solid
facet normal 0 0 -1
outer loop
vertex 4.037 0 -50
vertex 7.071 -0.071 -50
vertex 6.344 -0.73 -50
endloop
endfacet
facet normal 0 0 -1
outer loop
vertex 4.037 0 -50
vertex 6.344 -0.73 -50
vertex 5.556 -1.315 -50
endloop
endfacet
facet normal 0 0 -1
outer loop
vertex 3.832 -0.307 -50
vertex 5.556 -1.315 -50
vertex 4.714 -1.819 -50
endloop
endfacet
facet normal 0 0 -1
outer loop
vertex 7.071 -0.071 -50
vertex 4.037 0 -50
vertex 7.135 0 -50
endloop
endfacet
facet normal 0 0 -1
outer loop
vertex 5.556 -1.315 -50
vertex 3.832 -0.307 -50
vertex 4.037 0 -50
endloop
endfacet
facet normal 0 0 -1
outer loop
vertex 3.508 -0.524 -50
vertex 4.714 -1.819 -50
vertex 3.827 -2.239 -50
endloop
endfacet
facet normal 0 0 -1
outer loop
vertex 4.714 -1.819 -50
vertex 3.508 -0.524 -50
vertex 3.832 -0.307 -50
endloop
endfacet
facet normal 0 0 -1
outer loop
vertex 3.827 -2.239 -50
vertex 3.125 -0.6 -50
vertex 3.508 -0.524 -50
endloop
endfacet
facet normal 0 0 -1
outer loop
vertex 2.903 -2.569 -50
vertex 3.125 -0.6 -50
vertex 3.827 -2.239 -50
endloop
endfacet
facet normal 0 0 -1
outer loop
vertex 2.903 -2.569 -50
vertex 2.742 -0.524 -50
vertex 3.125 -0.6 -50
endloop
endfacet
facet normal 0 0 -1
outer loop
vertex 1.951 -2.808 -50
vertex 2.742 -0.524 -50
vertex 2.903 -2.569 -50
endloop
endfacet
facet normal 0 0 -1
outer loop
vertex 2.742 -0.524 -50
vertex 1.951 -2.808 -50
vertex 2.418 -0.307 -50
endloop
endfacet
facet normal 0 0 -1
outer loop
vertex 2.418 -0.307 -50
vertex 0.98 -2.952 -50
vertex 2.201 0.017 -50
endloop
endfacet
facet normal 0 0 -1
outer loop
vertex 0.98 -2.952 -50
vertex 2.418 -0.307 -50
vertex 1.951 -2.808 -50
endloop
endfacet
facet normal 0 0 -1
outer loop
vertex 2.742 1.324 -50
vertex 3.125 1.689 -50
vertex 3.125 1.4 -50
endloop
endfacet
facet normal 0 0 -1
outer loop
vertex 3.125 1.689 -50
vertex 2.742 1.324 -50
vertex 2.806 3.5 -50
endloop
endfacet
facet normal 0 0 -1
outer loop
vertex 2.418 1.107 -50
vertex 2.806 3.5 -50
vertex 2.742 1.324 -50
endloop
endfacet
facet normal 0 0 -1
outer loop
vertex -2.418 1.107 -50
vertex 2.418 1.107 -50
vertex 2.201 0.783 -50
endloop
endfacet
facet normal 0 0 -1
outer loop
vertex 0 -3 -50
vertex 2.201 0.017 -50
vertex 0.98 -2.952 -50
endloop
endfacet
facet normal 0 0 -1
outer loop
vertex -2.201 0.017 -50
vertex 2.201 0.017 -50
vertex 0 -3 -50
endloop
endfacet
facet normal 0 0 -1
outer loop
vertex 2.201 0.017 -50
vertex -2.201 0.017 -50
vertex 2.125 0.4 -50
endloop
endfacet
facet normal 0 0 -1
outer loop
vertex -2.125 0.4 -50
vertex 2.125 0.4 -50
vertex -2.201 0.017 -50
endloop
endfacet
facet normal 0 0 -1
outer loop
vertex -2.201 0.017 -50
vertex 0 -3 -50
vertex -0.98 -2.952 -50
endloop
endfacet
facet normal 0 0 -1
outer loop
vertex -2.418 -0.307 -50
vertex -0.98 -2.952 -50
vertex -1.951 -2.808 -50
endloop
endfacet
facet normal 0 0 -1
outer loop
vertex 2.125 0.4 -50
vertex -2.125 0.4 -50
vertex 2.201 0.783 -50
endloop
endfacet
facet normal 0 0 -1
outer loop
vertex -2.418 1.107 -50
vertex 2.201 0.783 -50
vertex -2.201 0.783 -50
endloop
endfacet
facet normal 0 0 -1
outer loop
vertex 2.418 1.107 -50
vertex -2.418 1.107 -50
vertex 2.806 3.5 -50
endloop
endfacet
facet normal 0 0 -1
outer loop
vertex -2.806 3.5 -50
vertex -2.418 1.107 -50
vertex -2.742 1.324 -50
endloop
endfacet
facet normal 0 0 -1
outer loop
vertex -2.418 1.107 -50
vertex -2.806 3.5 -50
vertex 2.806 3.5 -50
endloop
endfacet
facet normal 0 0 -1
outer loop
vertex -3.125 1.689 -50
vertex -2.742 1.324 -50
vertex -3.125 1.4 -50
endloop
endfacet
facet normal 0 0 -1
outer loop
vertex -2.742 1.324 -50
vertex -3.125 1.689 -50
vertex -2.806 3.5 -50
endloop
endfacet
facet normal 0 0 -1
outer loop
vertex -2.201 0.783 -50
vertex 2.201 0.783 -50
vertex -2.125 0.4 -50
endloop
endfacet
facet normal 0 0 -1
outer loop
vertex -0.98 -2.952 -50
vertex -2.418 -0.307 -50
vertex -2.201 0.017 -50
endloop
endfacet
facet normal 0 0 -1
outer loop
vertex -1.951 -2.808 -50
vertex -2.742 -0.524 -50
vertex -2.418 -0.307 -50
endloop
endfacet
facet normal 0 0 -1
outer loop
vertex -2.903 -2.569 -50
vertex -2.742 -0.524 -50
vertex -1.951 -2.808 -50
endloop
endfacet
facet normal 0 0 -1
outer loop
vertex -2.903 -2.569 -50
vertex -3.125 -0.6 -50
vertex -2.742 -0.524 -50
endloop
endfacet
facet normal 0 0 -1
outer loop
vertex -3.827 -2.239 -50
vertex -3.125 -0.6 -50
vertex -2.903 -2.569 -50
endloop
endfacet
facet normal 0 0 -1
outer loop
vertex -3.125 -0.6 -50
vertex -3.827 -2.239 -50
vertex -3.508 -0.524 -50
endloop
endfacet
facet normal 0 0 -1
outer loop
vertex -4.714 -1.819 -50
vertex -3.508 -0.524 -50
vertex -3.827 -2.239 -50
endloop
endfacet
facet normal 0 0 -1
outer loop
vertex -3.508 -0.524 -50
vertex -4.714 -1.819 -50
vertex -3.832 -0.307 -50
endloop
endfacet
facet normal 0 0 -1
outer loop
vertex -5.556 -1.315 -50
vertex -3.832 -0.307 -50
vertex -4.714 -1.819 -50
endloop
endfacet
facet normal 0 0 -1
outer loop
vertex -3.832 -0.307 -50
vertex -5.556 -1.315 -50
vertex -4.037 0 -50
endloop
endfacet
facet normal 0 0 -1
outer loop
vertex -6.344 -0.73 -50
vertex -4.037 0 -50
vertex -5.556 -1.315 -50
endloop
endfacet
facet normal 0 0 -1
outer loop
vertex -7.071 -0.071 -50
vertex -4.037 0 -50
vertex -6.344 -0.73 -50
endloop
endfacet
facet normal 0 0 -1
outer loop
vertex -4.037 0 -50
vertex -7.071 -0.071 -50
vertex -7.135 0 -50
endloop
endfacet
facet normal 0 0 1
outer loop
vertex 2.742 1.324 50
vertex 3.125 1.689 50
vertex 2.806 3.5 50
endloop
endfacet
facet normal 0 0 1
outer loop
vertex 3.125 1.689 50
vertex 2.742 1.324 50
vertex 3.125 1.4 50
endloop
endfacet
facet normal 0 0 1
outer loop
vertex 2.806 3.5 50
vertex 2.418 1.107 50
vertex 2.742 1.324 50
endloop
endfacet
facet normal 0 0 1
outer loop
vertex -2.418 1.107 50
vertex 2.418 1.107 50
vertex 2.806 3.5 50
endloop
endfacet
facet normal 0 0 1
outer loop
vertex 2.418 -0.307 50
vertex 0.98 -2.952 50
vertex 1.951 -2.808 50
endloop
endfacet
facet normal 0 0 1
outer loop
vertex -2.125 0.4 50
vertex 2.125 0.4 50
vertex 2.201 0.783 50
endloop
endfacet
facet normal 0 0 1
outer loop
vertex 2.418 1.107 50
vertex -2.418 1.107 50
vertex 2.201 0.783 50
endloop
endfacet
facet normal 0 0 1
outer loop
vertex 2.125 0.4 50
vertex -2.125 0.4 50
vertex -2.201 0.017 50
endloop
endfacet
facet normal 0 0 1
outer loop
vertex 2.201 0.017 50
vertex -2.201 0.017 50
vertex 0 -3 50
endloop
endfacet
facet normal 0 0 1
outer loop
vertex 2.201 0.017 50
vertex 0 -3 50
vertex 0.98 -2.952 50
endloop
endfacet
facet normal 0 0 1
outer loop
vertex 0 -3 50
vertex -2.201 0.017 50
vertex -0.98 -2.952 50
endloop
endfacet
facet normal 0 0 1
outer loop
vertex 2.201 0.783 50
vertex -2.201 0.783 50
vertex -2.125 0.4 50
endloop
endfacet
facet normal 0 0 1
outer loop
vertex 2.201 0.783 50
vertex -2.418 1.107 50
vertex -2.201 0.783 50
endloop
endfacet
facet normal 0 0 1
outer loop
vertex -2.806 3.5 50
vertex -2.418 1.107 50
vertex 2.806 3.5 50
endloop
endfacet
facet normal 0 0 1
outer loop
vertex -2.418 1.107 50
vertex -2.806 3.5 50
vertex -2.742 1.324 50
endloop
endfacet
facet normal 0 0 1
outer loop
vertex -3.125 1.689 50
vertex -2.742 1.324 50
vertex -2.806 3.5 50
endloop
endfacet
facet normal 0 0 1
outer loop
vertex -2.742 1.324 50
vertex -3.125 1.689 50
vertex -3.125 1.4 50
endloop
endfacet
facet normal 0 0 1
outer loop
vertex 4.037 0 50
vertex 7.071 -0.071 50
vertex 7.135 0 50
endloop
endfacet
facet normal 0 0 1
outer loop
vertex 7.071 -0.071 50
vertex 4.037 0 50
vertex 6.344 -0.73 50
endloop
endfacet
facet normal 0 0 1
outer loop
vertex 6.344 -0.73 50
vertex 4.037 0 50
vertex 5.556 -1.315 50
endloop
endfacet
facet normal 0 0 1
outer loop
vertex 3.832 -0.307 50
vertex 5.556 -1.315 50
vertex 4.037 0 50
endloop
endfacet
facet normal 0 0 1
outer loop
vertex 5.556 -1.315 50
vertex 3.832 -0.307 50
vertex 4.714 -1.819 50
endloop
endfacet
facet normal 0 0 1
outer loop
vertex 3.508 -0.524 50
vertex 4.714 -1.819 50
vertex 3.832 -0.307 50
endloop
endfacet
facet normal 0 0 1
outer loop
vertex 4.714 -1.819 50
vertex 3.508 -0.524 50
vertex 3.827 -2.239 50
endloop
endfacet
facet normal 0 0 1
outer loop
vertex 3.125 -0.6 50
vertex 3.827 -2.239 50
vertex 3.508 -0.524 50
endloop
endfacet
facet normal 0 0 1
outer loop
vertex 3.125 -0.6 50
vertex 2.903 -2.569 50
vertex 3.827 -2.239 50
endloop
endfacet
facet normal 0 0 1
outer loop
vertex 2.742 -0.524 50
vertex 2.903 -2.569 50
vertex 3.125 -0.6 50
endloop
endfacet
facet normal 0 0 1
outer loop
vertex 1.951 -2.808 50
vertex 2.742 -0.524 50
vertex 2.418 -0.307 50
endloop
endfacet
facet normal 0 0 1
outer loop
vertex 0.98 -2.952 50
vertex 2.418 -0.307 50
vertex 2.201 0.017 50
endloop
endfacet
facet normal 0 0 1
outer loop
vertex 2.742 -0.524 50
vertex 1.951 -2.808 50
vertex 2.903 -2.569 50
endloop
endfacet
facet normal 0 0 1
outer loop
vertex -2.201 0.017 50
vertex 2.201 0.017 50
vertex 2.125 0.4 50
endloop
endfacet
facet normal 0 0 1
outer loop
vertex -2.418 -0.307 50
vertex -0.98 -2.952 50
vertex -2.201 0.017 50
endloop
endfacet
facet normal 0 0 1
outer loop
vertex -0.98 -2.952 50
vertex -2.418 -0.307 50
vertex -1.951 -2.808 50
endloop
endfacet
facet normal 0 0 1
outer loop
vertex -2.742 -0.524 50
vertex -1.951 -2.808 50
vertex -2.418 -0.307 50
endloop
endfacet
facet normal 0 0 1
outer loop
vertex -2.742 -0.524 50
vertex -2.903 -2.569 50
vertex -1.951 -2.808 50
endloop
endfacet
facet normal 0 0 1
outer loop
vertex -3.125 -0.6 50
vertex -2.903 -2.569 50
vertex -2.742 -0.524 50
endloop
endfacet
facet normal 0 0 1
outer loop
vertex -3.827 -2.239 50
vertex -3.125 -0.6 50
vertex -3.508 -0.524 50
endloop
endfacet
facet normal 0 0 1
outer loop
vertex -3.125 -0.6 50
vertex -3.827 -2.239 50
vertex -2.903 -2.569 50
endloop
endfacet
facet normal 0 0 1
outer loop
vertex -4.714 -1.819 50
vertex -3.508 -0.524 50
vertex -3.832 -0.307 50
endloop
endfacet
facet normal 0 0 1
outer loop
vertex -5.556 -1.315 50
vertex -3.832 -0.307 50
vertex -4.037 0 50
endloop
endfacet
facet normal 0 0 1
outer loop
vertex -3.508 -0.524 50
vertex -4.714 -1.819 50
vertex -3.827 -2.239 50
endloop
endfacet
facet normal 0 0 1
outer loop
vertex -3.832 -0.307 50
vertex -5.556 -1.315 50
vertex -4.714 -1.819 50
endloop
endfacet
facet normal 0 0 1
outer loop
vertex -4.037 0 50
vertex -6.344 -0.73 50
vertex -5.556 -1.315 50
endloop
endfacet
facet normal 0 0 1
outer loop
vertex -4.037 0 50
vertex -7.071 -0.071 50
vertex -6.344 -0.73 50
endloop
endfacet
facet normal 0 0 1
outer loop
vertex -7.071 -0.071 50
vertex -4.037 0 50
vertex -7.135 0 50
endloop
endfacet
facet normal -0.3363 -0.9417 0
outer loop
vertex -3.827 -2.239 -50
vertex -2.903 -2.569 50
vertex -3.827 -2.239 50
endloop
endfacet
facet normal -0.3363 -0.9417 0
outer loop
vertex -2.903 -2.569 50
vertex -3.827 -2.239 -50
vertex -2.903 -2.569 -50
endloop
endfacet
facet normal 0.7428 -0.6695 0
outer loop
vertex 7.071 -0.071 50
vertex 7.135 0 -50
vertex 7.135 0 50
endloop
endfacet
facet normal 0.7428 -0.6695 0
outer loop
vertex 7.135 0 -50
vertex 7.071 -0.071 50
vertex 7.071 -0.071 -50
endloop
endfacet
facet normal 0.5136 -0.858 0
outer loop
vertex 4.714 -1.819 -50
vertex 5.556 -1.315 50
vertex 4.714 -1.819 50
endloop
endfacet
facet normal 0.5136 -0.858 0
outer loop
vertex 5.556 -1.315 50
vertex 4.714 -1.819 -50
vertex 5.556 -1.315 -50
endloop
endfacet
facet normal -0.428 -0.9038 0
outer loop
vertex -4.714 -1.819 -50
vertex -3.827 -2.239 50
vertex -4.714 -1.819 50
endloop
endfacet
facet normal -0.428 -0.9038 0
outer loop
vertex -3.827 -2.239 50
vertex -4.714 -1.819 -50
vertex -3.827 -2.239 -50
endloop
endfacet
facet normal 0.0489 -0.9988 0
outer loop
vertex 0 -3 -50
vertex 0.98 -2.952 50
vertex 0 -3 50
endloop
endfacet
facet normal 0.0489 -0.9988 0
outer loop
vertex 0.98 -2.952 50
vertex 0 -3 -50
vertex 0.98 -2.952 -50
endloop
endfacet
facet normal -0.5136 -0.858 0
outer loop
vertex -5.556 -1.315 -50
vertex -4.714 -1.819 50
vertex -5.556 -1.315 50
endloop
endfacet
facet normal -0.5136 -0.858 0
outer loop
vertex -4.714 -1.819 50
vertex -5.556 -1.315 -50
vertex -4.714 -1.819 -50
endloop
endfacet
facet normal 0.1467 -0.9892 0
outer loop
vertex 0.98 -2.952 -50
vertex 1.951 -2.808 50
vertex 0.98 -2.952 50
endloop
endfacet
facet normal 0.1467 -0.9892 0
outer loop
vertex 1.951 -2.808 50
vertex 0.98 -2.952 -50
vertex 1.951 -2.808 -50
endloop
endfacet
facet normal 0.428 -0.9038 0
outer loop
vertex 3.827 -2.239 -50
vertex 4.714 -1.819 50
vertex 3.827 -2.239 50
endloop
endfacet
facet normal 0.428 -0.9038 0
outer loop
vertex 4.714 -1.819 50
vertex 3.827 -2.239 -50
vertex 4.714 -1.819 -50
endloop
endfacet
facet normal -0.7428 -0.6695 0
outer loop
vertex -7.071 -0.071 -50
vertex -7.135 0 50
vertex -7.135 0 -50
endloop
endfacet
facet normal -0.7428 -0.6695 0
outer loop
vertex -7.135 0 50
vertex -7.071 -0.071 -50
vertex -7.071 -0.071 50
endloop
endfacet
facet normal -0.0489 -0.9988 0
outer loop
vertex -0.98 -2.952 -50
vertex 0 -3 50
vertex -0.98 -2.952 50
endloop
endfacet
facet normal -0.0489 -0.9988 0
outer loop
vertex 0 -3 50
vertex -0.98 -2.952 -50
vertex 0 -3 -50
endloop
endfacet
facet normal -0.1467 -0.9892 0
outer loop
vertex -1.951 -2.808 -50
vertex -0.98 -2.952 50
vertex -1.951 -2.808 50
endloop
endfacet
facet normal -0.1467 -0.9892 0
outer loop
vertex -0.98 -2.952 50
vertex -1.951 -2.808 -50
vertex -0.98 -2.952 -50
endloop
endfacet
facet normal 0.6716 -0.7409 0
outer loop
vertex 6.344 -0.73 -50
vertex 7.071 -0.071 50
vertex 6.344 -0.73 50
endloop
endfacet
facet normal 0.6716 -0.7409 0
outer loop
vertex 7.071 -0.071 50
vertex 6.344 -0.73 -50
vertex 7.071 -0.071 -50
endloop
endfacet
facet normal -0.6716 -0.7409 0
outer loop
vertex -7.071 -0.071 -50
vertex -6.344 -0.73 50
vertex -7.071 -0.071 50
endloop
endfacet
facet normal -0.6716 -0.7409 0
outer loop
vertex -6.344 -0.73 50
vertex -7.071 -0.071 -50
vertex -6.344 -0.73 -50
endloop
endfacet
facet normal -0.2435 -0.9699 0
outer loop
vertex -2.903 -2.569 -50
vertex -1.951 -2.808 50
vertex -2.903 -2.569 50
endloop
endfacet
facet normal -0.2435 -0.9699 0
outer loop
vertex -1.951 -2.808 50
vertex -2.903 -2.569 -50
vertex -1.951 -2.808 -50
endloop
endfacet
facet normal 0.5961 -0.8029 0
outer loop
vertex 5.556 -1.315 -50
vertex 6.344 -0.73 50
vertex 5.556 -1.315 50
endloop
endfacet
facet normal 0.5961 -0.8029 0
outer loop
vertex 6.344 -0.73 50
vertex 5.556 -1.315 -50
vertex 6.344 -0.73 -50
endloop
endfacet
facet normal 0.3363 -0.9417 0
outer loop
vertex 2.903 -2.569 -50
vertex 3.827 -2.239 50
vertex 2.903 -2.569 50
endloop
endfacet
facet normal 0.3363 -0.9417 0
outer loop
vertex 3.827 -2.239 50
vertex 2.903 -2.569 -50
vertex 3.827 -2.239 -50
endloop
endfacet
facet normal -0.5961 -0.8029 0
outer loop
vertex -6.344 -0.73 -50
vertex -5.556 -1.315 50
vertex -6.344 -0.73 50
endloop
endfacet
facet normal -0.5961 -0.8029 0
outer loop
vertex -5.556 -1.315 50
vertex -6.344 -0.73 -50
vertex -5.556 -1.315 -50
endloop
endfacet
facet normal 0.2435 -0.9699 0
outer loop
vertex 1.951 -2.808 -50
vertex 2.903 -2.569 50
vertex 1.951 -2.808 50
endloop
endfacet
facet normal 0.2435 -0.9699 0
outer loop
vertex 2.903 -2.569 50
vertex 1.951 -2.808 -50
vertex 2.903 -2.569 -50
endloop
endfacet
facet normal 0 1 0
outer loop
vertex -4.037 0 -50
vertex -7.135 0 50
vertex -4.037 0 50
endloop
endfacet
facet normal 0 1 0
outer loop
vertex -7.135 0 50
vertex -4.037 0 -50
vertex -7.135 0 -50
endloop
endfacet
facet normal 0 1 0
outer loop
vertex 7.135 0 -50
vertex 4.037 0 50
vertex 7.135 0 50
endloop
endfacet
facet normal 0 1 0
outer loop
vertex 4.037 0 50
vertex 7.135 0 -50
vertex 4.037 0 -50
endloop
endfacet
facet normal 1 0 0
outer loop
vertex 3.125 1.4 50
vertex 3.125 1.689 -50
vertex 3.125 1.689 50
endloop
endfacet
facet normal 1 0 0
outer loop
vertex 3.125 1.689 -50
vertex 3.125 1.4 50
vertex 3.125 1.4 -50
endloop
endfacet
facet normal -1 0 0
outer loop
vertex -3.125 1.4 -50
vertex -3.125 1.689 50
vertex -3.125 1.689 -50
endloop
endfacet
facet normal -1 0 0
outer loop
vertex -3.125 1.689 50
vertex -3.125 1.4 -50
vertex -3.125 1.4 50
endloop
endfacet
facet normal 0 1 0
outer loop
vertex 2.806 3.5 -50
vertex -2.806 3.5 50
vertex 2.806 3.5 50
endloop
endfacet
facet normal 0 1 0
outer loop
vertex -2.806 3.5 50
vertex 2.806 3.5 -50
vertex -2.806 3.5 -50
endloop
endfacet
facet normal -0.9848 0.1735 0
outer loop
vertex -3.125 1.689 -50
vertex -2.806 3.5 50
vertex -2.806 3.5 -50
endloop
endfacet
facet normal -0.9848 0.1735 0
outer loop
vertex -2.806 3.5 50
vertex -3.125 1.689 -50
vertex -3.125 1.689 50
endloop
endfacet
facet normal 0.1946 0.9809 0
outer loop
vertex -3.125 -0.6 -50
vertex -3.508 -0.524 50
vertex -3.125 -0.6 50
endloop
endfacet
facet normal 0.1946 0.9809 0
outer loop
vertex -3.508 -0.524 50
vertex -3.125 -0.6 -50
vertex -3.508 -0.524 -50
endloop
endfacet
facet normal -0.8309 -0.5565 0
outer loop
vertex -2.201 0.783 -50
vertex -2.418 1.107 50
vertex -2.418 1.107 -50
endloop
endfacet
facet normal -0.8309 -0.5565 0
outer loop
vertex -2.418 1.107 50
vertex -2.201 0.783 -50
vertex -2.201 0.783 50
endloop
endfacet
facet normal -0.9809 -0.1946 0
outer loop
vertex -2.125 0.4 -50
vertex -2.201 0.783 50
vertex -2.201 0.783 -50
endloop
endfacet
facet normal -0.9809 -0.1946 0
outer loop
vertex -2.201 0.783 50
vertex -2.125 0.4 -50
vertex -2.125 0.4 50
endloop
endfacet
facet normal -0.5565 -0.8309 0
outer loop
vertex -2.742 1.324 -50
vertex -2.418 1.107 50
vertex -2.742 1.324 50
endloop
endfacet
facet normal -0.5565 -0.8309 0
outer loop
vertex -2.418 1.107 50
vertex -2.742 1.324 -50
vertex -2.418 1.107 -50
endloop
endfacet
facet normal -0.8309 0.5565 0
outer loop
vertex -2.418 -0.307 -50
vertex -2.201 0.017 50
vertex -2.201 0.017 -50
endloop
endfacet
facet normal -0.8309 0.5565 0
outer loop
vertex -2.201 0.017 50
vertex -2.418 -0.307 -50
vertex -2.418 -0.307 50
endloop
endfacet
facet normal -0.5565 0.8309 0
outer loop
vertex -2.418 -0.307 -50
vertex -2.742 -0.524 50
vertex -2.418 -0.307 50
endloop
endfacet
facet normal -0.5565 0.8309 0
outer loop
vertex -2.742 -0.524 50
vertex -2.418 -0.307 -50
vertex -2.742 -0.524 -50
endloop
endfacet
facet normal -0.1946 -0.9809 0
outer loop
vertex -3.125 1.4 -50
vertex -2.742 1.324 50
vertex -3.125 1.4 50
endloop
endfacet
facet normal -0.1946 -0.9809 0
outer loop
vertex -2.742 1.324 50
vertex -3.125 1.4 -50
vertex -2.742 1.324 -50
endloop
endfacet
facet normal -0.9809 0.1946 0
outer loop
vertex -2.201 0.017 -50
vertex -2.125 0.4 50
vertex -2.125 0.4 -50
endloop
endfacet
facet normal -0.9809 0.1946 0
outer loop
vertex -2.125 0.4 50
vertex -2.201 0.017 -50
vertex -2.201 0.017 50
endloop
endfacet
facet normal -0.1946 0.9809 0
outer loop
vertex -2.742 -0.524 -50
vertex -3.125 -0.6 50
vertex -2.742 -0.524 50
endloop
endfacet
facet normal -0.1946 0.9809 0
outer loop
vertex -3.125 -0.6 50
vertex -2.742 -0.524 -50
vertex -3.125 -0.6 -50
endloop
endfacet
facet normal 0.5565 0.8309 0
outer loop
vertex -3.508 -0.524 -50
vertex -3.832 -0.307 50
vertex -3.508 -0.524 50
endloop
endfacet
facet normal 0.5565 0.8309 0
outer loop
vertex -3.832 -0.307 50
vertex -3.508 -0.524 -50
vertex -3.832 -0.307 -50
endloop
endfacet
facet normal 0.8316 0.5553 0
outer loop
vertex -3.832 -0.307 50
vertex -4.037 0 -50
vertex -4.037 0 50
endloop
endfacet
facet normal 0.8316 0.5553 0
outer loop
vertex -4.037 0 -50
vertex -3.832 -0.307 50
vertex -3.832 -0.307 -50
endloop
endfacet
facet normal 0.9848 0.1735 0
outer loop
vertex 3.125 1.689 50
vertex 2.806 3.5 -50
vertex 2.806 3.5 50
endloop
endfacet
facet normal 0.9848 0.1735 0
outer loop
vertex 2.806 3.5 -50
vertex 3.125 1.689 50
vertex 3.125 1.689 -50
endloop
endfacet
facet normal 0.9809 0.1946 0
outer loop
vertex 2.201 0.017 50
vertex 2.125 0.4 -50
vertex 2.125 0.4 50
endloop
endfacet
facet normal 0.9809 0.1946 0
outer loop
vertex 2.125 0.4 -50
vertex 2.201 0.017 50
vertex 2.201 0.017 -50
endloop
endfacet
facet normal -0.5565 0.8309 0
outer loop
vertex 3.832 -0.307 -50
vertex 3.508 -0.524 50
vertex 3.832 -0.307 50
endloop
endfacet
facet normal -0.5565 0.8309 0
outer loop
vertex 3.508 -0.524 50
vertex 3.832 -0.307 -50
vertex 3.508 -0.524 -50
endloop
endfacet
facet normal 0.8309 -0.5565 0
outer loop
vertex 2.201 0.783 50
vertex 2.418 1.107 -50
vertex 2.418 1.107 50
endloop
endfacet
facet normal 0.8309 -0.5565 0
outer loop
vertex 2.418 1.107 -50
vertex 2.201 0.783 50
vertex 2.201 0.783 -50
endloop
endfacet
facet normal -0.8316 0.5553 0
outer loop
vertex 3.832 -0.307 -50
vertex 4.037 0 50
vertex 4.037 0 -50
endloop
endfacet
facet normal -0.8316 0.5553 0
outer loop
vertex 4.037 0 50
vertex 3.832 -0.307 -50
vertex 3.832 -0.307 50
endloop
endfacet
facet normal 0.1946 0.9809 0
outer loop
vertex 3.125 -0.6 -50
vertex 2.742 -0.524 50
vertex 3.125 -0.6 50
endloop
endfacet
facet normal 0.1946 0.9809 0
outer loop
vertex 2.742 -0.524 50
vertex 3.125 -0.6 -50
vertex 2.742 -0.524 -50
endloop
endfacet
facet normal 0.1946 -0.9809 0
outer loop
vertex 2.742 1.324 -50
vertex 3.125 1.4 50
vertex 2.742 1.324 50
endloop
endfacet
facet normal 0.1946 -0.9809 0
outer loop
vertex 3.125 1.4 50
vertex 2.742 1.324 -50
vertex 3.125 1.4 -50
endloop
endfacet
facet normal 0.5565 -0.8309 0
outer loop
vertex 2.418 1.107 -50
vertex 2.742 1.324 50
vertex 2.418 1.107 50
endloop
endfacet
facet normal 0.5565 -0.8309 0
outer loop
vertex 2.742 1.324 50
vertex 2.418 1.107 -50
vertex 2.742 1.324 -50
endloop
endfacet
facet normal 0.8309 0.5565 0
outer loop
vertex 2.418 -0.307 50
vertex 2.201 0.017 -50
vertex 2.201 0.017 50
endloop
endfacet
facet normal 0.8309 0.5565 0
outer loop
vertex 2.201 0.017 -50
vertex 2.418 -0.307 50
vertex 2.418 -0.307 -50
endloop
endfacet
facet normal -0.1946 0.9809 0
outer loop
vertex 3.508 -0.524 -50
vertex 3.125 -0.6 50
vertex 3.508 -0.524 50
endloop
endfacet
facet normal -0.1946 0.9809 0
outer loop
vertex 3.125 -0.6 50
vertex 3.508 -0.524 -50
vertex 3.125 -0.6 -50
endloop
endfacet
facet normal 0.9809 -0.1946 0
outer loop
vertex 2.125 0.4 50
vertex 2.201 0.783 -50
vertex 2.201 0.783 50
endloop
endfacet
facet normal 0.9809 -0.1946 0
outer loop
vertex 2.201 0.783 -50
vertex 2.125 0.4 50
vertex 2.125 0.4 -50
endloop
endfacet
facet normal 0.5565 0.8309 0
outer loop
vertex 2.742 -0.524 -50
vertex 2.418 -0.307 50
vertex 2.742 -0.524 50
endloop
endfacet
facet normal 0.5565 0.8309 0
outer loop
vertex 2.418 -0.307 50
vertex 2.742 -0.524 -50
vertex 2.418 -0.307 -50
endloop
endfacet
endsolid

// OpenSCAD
//The height of the cover
height=100;




holeSize=6.25;


depth=3.5;

difference()
{
    union()
    {
        difference()
        {
            translate([0,7,0]) cylinder(r=10, h=height, center=true, $fn=64);
            translate([0,10,0]) cube([20,20,height+1], center=true);
        }
        translate([0,depth/2, 0]) cube([holeSize, 3.5, height], center=true);
    } 
    for (x=[-1,1])
    {
        translate([x*5.45,2.9,0]) rotate([0,0,x*10]) cube([5,5,height+1], center=true);
        translate([x*holeSize/2,0.4,0]) cylinder(r=1, h=height+1, center=true, $fn=16);
    }
}
